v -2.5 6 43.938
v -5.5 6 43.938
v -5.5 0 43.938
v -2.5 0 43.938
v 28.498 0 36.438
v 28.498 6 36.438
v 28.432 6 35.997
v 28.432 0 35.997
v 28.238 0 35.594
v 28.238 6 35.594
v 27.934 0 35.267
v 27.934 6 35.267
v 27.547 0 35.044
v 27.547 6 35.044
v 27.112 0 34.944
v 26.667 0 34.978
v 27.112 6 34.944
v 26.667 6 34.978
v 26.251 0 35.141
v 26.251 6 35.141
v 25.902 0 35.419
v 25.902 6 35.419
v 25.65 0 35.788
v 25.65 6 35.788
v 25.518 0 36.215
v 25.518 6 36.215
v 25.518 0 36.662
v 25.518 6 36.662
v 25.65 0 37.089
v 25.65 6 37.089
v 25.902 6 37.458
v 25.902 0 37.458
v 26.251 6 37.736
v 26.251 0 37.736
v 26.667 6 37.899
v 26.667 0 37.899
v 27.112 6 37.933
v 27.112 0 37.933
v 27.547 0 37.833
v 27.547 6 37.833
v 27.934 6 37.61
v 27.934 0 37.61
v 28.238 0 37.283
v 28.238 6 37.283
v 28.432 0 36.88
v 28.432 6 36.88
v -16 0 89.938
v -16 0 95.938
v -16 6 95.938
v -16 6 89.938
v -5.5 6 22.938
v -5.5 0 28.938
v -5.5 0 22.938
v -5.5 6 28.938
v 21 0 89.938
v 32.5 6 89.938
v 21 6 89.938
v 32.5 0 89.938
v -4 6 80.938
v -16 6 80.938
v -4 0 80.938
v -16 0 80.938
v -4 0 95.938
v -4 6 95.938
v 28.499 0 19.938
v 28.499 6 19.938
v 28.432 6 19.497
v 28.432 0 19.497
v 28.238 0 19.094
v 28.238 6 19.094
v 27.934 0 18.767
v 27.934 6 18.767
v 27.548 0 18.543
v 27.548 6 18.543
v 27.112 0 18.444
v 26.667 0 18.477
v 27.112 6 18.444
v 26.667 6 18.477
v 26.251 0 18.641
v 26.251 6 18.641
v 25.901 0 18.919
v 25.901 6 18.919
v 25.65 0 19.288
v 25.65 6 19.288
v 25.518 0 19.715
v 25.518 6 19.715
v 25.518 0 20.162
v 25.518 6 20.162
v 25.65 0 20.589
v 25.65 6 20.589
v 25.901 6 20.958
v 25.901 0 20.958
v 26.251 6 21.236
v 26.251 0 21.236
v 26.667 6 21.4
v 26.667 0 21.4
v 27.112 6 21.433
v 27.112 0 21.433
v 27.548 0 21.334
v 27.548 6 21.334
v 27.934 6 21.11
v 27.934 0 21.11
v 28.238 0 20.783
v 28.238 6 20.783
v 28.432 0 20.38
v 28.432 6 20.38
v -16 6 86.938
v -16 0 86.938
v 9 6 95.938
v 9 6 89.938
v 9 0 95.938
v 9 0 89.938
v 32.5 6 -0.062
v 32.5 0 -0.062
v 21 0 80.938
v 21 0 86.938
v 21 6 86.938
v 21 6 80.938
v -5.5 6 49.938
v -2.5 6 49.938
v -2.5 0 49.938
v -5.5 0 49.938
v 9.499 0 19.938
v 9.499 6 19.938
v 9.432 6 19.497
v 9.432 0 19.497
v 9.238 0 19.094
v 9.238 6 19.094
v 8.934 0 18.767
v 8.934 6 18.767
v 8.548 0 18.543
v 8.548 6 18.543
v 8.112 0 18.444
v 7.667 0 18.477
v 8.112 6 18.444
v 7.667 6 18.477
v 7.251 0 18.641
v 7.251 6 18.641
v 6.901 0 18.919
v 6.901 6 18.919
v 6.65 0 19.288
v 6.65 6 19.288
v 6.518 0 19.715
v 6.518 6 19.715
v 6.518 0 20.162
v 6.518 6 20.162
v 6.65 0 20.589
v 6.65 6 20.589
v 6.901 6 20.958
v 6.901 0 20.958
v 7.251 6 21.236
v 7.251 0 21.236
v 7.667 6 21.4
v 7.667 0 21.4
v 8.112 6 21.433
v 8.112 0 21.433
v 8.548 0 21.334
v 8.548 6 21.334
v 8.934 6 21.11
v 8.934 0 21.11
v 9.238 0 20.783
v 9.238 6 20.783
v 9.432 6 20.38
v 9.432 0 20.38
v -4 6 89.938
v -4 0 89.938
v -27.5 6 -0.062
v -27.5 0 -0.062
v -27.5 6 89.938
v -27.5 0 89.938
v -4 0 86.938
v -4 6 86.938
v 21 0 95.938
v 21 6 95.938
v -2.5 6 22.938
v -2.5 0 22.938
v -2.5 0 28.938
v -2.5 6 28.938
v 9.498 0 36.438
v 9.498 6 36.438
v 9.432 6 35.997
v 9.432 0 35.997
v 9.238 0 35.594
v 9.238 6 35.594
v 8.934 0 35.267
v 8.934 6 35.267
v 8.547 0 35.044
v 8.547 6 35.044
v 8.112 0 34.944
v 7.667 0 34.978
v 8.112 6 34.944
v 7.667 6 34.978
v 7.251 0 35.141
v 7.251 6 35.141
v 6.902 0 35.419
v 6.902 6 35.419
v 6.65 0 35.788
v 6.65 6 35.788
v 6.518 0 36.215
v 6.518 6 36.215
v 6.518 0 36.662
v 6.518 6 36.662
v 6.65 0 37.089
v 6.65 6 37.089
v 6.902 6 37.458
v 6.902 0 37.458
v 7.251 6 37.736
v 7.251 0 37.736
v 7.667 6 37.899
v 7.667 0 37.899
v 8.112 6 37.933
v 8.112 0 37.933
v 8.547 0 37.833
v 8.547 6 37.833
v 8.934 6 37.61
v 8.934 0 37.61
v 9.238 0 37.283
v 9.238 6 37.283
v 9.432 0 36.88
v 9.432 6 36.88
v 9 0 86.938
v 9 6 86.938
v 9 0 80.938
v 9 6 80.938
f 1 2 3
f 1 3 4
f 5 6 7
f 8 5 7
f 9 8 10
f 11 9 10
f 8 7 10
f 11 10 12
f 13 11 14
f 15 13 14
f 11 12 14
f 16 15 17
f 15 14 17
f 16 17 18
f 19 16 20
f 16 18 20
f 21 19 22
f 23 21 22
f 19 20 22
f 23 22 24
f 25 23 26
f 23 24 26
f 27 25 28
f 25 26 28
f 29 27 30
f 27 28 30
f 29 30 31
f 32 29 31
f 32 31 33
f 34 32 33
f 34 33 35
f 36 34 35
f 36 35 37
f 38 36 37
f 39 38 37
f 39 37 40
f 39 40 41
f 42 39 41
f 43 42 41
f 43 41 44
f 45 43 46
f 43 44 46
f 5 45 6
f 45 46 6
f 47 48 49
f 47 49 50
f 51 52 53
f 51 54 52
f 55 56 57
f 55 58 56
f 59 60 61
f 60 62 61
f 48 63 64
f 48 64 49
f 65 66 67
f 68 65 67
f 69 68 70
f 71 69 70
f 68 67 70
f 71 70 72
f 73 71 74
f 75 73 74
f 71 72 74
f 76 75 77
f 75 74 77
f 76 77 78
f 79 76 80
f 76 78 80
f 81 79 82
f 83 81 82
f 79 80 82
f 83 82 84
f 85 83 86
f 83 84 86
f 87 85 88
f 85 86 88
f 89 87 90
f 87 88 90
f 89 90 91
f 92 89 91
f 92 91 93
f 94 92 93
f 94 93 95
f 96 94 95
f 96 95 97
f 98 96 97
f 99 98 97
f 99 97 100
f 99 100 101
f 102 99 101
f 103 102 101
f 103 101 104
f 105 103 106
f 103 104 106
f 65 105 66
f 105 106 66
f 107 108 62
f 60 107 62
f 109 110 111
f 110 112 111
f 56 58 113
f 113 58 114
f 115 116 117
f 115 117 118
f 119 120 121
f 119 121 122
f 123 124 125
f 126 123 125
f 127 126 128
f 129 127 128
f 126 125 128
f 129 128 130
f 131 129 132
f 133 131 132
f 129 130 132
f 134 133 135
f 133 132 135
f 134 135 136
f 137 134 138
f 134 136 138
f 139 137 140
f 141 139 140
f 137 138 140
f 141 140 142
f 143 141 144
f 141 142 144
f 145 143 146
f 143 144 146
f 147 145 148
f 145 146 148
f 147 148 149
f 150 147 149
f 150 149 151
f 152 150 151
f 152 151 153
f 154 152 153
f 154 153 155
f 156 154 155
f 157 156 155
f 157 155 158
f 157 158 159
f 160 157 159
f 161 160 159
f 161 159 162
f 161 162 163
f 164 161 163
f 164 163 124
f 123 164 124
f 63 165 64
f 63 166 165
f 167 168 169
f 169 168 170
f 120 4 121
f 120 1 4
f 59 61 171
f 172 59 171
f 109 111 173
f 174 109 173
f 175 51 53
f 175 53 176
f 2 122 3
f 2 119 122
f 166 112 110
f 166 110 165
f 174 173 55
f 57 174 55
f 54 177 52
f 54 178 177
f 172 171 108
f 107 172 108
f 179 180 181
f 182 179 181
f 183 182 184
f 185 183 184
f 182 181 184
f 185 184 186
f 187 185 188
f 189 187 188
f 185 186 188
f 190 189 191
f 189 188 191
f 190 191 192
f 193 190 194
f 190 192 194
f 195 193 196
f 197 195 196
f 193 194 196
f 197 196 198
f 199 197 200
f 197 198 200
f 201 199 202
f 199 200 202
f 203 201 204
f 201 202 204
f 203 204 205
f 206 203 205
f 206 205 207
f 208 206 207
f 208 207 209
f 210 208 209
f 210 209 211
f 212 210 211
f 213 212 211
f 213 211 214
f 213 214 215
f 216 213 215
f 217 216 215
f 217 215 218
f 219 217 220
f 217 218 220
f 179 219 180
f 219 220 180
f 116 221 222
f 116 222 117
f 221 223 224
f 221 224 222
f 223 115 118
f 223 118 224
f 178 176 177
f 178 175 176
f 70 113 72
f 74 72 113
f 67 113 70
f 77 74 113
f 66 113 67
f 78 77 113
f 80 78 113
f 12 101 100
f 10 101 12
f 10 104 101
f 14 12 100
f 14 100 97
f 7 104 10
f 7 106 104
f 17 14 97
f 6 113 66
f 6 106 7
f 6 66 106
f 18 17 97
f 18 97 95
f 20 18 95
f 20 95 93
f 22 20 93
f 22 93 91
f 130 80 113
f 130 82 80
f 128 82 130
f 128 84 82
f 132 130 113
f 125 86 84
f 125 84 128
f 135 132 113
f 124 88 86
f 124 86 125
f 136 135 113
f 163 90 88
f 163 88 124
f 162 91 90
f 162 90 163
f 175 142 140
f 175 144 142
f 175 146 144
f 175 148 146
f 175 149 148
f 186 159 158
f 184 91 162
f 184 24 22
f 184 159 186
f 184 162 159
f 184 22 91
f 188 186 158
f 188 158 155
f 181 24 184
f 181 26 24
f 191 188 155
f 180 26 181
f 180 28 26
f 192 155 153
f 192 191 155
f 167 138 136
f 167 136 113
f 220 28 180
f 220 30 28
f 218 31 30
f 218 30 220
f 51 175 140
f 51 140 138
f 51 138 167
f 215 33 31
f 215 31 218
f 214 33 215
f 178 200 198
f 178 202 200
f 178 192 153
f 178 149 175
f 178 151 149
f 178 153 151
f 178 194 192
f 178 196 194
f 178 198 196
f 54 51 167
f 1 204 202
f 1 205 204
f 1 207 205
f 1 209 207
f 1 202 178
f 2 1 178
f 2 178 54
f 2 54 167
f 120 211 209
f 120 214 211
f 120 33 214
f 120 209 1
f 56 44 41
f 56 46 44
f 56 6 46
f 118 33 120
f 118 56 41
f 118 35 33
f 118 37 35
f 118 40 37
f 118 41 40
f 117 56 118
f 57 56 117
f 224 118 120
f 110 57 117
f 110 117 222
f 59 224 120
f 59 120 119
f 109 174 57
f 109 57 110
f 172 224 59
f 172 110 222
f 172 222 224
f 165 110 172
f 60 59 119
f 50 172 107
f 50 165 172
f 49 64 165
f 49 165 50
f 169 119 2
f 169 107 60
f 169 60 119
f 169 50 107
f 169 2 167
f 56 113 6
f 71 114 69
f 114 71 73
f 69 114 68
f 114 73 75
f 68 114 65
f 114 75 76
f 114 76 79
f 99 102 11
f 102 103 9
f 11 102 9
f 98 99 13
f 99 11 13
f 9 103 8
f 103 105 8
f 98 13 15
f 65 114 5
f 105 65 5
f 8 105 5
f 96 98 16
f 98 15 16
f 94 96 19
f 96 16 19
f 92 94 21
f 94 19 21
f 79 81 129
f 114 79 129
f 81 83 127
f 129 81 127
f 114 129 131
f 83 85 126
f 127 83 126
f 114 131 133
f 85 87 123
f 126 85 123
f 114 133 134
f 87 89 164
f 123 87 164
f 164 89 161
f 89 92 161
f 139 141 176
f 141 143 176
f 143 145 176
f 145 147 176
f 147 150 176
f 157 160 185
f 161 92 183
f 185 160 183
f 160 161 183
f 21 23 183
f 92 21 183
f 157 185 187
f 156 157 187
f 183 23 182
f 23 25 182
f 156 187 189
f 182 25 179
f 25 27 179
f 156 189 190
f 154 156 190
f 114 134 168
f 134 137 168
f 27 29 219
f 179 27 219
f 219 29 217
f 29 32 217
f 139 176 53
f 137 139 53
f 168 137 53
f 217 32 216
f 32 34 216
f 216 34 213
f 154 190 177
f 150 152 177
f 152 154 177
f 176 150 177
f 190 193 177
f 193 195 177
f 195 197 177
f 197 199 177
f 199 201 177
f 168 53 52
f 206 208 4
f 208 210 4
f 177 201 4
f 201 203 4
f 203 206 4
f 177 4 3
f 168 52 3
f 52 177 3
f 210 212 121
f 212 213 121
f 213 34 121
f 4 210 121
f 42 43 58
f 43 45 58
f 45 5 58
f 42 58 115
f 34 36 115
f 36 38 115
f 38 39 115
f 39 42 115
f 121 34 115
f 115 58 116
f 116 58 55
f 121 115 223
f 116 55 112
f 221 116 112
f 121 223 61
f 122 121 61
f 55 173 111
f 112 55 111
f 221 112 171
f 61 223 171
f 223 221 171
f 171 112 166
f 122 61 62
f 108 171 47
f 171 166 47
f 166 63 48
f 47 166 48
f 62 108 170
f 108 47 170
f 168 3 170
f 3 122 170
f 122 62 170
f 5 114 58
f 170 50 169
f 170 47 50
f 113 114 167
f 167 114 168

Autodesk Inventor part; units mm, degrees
ref_plane "YZ Plane" through (0, 0, 0) normal (1, 0, 0) x (0, 1, 0)
ref_plane "XZ Plane" through (0, 0, 0) normal (0, 1, 0) x (-1, 0, 0)
ref_plane "XY Plane" through (0, 0, 0) normal (0, 0, 1) x (1, 0, 0)
sketch "Sketch1" plane through (0, 0, 0) normal (0, 1, 0) x (-1, 0, 0)
  line L0 (27.5, -0.0615) -> (27.5, 89.9385)
  line L1 (-32.5, 89.9385) -> (-32.5, -0.0615)
  line L2 (-32.5, -0.0615) -> (-2.5, -0.0615)
  line L3 (-2.5, -0.0615) -> (-2.5, 89.9385) construction
  line L4 (-32.5, 44.9385) -> (-2.5, 44.9385) construction
  line L5 (-32.5, 89.9385) -> (27.5, 89.9385)
  line L6 (-21, 89.9385) -> (-9, 89.9385)
  line L7 (-9, 89.9385) -> (-9, 95.9385)
  line L8 (-9, 95.9385) -> (-21, 95.9385)
  line L9 (-21, 95.9385) -> (-21, 89.9385)
  line L10 (16, 89.9385) -> (4, 89.9385)
  line L11 (4, 89.9385) -> (4, 95.9385)
  line L12 (4, 95.9385) -> (16, 95.9385)
  line L13 (16, 95.9385) -> (16, 89.9385)
  line L14 (-2.5, 44.9385) -> (27.5, 44.9385) construction
  line L15 (-2.5, -0.0615) -> (27.5, -0.0615)
  line L16 (-9, 86.9385) -> (-21, 86.9385)
  line L17 (-21, 86.9385) -> (-21, 80.9385)
  line L18 (-21, 80.9385) -> (-9, 80.9385)
  line L19 (-9, 80.9385) -> (-9, 86.9385)
  line L20 (-9, 86.9385) -> (-21, 80.9385) construction
  line L21 (-21, 86.9385) -> (-9, 80.9385) construction
  line L22 (4, 86.9385) -> (16, 86.9385)
  line L23 (16, 86.9385) -> (16, 80.9385)
  line L24 (16, 80.9385) -> (4, 80.9385)
  line L25 (4, 80.9385) -> (4, 86.9385)
  line L26 (4, 86.9385) -> (16, 80.9385) construction
  line L27 (16, 86.9385) -> (4, 80.9385) construction
  point P0 (-15, 83.9385)
  point P1 (10, 83.9385)
  dimension "d0" = 60
  dimension "d1" = 90
  dimension "d18" = 12
  dimension "d19" = 6
  dimension "d20" = 18.5
  dimension "d21" = 12
  dimension "d22" = 6
  dimension "d23" = 3
extrude "Extrusion1" add sketch "Sketch1" along normal blind 6
sketch "Sketch2" plane through (0, 6, 0) normal (0, 1, 0) x (1, 0, 0)
  circle A0 centre (8, -19.9385) radius 1.4986
  circle A1 centre (27, -19.9385) radius 1.4986
  circle A2 centre (27, -36.4385) radius 1.4985
  circle A3 centre (8, -36.4385) radius 1.4985
  line L0 (27, -36.4385) -> (8, -36.4385) construction
  line L1 (8, -36.4385) -> (8, -19.9385) construction
  line L2 (8, -19.9385) -> (27, -19.9385) construction
  line L3 (27, -19.9385) -> (27, -36.4385) construction
  line L4 (27, -36.4385) -> (8, -19.9385) construction
  line L5 (27, -19.9385) -> (8, -36.4385) construction
  line L6 (32.5, 0.0615) -> (-27.5, 0.0615) construction
  line L7 (2.5, 0.0615) -> (2.5, -89.9385) construction
  line L8 (-4, -89.9385) -> (9, -89.9385) construction
  line L9 (-2.5, -49.9385) -> (-5.5, -49.9385)
  line L10 (-5.5, -49.9385) -> (-5.5, -43.9385)
  line L11 (-5.5, -43.9385) -> (-2.5, -43.9385)
  line L12 (-2.5, -43.9385) -> (-2.5, -49.9385)
  line L13 (-2.5, -28.9385) -> (-5.5, -28.9385)
  line L14 (-5.5, -28.9385) -> (-5.5, -22.9385)
  line L15 (-5.5, -22.9385) -> (-2.5, -22.9385)
  line L16 (-2.5, -22.9385) -> (-2.5, -28.9385)
  point P0 (0, 0)
  point P1 (17.5, -28.1885)
  dimension "d26" = 2.9972
  dimension "d28" = 2.9972
  dimension "d29" = 19
  dimension "d30" = 2.997
  dimension "d31" = 2.997
  dimension "d32" = 16.5
  dimension "d33" = 15
  dimension "d36" = 20
  dimension "d37" = 3
  dimension "d38" = 6
  dimension "d39" = 6
  dimension "d40" = 5
  dimension "d41" = 40
  dimension "d42" = 15
extrude "Extrusion2" cut sketch "Sketch2" against normal through all
properties part number "thumper-bumper-sidewall-v2"
